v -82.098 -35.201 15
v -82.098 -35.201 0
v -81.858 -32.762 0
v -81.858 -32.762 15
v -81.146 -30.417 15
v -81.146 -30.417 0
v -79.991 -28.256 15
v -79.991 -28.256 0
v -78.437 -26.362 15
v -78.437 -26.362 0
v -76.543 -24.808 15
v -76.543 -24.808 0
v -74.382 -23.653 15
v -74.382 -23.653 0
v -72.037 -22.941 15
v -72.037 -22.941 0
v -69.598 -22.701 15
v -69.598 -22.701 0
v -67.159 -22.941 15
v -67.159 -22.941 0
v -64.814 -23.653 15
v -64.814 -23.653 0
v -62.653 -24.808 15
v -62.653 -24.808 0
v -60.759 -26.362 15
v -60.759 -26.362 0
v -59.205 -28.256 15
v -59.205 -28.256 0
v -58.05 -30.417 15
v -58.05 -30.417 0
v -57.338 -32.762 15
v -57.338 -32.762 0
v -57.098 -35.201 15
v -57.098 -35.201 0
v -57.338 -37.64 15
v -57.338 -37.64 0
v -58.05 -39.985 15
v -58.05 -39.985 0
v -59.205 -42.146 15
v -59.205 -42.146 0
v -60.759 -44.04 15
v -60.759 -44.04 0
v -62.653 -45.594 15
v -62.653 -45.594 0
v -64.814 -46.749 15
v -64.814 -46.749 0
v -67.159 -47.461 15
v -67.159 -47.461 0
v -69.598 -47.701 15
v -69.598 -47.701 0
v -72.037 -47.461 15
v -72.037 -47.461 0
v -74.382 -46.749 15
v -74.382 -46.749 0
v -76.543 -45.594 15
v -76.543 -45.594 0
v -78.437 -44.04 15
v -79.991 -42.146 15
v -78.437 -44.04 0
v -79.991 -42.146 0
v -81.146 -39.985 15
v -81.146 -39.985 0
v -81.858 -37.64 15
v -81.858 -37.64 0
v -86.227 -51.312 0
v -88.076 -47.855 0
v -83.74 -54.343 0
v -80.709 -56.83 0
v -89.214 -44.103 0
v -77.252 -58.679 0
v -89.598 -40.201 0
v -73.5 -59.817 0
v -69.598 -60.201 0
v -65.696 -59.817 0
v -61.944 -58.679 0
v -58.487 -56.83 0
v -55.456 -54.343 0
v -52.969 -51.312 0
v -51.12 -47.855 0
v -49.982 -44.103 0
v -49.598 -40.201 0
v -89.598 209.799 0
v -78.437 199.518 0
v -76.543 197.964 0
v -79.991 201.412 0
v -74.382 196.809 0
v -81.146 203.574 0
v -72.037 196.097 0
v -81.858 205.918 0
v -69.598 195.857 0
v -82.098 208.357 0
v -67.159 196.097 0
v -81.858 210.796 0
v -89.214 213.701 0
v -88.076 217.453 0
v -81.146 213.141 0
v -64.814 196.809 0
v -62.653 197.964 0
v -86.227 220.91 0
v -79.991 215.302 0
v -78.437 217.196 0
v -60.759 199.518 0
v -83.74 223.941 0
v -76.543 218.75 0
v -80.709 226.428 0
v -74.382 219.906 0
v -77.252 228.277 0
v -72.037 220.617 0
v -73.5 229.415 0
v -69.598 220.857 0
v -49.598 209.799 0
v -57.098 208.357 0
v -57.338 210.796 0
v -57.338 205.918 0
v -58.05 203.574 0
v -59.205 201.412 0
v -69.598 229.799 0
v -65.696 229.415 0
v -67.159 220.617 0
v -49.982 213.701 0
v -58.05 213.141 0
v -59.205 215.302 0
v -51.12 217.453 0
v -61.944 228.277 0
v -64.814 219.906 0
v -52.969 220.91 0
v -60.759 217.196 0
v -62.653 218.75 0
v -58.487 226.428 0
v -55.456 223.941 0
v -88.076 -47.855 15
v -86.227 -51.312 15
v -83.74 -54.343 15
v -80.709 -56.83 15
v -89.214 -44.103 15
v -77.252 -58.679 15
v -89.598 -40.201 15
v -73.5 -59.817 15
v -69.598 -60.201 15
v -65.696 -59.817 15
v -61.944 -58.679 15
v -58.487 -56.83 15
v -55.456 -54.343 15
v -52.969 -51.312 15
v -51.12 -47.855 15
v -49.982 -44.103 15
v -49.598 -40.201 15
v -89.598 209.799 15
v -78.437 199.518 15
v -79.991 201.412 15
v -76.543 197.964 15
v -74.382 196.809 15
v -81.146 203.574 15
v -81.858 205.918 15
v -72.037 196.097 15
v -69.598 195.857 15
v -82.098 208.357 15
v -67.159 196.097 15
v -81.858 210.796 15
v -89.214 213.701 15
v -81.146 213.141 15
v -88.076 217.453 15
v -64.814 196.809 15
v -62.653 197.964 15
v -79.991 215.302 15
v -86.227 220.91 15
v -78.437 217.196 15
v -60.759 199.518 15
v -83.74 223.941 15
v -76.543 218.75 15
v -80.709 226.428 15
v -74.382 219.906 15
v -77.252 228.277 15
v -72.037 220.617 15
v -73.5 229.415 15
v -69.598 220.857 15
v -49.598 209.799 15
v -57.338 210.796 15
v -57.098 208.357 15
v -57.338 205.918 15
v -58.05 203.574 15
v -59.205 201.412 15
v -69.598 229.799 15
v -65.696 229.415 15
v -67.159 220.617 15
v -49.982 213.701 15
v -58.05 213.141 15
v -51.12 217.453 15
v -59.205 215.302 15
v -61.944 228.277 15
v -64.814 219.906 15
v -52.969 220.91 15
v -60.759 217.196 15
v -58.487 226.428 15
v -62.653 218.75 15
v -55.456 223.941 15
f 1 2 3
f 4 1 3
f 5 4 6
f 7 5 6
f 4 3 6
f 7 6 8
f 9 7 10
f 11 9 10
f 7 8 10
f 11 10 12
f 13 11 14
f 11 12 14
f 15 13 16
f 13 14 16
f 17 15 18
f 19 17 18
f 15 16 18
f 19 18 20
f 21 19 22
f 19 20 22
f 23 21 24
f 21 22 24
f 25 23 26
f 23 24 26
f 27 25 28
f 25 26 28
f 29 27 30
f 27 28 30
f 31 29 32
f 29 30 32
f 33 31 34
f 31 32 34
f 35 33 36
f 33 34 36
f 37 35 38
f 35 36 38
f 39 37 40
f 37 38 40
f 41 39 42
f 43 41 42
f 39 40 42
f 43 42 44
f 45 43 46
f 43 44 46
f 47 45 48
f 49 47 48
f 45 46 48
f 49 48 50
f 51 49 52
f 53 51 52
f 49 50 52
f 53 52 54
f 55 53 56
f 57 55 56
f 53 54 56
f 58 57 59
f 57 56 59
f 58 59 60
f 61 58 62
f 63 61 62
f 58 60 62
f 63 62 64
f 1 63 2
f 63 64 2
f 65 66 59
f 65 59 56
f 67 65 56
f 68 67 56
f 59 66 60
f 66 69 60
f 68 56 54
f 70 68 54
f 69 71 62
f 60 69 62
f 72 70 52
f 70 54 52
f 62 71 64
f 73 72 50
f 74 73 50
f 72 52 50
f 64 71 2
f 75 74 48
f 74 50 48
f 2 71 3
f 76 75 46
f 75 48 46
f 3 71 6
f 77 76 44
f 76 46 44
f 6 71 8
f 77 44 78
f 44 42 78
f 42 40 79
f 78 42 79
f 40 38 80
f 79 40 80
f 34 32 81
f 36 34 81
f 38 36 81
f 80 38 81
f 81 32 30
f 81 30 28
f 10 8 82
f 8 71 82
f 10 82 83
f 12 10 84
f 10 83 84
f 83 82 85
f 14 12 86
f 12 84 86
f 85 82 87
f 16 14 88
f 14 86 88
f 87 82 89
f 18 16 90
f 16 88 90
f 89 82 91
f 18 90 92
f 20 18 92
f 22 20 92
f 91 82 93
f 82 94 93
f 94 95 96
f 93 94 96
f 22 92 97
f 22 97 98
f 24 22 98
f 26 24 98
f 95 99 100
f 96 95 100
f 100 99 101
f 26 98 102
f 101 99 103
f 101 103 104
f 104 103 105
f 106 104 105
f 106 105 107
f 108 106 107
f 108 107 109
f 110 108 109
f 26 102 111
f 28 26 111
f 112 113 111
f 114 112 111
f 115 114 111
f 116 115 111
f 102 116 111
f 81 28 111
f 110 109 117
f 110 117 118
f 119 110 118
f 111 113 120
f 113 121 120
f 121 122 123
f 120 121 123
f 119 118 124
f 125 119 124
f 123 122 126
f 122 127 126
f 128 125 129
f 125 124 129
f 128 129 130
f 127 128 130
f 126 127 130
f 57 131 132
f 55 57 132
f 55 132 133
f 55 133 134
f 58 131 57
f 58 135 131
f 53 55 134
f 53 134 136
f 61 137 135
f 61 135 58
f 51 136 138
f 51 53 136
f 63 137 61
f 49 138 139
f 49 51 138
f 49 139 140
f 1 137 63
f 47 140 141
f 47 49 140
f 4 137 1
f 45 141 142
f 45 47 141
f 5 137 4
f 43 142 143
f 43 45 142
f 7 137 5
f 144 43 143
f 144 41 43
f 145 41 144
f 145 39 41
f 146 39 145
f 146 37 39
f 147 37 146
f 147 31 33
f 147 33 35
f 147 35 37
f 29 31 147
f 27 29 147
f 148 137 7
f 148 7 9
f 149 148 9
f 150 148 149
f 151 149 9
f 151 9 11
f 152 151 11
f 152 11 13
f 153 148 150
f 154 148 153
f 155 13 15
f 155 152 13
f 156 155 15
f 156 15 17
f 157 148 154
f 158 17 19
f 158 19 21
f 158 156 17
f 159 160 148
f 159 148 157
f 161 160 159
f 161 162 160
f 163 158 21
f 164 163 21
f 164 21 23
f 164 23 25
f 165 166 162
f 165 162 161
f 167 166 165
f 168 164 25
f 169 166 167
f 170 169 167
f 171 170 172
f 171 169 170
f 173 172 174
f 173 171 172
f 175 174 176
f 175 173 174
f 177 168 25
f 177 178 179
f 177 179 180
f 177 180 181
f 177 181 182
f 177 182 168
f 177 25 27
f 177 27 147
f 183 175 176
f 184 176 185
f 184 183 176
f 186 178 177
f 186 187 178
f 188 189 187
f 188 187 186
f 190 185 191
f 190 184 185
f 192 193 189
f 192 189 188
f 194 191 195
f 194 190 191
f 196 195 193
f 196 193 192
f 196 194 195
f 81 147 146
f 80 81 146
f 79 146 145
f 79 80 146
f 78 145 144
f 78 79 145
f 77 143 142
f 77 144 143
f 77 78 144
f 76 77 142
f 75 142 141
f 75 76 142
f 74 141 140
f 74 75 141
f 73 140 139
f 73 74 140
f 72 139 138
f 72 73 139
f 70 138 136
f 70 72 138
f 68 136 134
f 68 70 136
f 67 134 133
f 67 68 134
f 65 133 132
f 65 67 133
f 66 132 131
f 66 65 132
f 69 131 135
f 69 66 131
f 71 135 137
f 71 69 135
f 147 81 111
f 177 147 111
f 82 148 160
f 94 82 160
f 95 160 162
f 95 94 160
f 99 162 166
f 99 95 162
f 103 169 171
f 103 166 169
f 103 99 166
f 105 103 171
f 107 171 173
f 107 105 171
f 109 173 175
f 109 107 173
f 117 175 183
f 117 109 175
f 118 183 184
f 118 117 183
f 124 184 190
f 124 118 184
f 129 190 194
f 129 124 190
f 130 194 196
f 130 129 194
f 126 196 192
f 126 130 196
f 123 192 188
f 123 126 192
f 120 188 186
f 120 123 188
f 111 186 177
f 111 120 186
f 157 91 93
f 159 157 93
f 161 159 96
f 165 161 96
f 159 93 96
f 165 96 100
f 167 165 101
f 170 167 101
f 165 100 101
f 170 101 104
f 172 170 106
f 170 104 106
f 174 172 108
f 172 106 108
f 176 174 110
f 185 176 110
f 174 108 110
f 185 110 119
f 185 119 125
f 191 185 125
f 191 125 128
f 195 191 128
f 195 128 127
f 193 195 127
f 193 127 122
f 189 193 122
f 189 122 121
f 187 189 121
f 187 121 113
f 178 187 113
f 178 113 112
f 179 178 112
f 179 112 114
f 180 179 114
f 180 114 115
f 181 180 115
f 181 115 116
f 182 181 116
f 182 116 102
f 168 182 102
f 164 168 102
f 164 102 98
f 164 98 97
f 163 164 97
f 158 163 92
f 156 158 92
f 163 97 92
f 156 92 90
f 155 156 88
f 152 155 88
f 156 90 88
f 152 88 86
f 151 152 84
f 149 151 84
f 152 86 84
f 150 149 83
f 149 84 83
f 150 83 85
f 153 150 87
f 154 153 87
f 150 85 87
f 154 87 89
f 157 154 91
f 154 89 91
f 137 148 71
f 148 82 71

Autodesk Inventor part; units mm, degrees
ref_plane "YZ Plane" through (0, 0, 0) normal (1, 0, 0) x (0, 1, 0)
ref_plane "XZ Plane" through (0, 0, 0) normal (0, 1, 0) x (-1, 0, 0)
ref_plane "XY Plane" through (0, 0, 0) normal (0, 0, 1) x (1, 0, 0)
sketch "Sketch1" plane through (0, 0, 0) normal (0, 0, 1) x (1, 0, 0)
  line L0 (-69.598, 209.799) -> (-69.598, -40.201) construction
  line L1 (-89.598, 209.799) -> (-89.598, -40.201)
  line L2 (-49.598, -40.201) -> (-49.598, 209.799)
  arc A0 (-49.598, 209.799) -> (-89.598, 209.799) centre (-69.598, 209.799) ccw
  arc A1 (-89.598, -40.201) -> (-49.598, -40.201) centre (-69.598, -40.201) ccw
  point P0 (0, 0)
  point P1 (-69.598, 84.799)
  dimension "d0" = 250
  dimension "d1" = 20
extrude "Extrusion1" add sketch "Sketch1" along normal blind 15
sketch "Sketch2" plane through (0, 0, 0) normal (0, 0, -1) x (-1, 0, 0)
  line L0 (49.598, -40.201) -> (49.598, 209.799) projected
  circle A0 centre (69.598, 208.3571) radius 12.5
  point P0 (0, 0)
  point P1 (69.598, 88.3571)
  dimension "d4" = 20
  dimension "d5" = 25
  dimension "d6" = 120
extrude "Extrusion2" cut sketch "Sketch2" against normal blind 20
sketch "Sketch3" plane through (0, 0, 0) normal (0, 0, -1) x (-1, 0, 0)
  line L0 (89.598, 209.799) -> (89.598, -40.201) projected
  circle A0 centre (69.598, -35.201) radius 12.5
  point P0 (0, 0)
  point P1 (69.598, 84.799)
  dimension "d9" = 20
  dimension "d10" = 125
  dimension "d11" = 25
  dimension "d12" = 120
  dimension "d13" = 20
extrude "Extrusion3" cut sketch "Sketch3" against normal blind 20
properties part number "drawing bot arm"
